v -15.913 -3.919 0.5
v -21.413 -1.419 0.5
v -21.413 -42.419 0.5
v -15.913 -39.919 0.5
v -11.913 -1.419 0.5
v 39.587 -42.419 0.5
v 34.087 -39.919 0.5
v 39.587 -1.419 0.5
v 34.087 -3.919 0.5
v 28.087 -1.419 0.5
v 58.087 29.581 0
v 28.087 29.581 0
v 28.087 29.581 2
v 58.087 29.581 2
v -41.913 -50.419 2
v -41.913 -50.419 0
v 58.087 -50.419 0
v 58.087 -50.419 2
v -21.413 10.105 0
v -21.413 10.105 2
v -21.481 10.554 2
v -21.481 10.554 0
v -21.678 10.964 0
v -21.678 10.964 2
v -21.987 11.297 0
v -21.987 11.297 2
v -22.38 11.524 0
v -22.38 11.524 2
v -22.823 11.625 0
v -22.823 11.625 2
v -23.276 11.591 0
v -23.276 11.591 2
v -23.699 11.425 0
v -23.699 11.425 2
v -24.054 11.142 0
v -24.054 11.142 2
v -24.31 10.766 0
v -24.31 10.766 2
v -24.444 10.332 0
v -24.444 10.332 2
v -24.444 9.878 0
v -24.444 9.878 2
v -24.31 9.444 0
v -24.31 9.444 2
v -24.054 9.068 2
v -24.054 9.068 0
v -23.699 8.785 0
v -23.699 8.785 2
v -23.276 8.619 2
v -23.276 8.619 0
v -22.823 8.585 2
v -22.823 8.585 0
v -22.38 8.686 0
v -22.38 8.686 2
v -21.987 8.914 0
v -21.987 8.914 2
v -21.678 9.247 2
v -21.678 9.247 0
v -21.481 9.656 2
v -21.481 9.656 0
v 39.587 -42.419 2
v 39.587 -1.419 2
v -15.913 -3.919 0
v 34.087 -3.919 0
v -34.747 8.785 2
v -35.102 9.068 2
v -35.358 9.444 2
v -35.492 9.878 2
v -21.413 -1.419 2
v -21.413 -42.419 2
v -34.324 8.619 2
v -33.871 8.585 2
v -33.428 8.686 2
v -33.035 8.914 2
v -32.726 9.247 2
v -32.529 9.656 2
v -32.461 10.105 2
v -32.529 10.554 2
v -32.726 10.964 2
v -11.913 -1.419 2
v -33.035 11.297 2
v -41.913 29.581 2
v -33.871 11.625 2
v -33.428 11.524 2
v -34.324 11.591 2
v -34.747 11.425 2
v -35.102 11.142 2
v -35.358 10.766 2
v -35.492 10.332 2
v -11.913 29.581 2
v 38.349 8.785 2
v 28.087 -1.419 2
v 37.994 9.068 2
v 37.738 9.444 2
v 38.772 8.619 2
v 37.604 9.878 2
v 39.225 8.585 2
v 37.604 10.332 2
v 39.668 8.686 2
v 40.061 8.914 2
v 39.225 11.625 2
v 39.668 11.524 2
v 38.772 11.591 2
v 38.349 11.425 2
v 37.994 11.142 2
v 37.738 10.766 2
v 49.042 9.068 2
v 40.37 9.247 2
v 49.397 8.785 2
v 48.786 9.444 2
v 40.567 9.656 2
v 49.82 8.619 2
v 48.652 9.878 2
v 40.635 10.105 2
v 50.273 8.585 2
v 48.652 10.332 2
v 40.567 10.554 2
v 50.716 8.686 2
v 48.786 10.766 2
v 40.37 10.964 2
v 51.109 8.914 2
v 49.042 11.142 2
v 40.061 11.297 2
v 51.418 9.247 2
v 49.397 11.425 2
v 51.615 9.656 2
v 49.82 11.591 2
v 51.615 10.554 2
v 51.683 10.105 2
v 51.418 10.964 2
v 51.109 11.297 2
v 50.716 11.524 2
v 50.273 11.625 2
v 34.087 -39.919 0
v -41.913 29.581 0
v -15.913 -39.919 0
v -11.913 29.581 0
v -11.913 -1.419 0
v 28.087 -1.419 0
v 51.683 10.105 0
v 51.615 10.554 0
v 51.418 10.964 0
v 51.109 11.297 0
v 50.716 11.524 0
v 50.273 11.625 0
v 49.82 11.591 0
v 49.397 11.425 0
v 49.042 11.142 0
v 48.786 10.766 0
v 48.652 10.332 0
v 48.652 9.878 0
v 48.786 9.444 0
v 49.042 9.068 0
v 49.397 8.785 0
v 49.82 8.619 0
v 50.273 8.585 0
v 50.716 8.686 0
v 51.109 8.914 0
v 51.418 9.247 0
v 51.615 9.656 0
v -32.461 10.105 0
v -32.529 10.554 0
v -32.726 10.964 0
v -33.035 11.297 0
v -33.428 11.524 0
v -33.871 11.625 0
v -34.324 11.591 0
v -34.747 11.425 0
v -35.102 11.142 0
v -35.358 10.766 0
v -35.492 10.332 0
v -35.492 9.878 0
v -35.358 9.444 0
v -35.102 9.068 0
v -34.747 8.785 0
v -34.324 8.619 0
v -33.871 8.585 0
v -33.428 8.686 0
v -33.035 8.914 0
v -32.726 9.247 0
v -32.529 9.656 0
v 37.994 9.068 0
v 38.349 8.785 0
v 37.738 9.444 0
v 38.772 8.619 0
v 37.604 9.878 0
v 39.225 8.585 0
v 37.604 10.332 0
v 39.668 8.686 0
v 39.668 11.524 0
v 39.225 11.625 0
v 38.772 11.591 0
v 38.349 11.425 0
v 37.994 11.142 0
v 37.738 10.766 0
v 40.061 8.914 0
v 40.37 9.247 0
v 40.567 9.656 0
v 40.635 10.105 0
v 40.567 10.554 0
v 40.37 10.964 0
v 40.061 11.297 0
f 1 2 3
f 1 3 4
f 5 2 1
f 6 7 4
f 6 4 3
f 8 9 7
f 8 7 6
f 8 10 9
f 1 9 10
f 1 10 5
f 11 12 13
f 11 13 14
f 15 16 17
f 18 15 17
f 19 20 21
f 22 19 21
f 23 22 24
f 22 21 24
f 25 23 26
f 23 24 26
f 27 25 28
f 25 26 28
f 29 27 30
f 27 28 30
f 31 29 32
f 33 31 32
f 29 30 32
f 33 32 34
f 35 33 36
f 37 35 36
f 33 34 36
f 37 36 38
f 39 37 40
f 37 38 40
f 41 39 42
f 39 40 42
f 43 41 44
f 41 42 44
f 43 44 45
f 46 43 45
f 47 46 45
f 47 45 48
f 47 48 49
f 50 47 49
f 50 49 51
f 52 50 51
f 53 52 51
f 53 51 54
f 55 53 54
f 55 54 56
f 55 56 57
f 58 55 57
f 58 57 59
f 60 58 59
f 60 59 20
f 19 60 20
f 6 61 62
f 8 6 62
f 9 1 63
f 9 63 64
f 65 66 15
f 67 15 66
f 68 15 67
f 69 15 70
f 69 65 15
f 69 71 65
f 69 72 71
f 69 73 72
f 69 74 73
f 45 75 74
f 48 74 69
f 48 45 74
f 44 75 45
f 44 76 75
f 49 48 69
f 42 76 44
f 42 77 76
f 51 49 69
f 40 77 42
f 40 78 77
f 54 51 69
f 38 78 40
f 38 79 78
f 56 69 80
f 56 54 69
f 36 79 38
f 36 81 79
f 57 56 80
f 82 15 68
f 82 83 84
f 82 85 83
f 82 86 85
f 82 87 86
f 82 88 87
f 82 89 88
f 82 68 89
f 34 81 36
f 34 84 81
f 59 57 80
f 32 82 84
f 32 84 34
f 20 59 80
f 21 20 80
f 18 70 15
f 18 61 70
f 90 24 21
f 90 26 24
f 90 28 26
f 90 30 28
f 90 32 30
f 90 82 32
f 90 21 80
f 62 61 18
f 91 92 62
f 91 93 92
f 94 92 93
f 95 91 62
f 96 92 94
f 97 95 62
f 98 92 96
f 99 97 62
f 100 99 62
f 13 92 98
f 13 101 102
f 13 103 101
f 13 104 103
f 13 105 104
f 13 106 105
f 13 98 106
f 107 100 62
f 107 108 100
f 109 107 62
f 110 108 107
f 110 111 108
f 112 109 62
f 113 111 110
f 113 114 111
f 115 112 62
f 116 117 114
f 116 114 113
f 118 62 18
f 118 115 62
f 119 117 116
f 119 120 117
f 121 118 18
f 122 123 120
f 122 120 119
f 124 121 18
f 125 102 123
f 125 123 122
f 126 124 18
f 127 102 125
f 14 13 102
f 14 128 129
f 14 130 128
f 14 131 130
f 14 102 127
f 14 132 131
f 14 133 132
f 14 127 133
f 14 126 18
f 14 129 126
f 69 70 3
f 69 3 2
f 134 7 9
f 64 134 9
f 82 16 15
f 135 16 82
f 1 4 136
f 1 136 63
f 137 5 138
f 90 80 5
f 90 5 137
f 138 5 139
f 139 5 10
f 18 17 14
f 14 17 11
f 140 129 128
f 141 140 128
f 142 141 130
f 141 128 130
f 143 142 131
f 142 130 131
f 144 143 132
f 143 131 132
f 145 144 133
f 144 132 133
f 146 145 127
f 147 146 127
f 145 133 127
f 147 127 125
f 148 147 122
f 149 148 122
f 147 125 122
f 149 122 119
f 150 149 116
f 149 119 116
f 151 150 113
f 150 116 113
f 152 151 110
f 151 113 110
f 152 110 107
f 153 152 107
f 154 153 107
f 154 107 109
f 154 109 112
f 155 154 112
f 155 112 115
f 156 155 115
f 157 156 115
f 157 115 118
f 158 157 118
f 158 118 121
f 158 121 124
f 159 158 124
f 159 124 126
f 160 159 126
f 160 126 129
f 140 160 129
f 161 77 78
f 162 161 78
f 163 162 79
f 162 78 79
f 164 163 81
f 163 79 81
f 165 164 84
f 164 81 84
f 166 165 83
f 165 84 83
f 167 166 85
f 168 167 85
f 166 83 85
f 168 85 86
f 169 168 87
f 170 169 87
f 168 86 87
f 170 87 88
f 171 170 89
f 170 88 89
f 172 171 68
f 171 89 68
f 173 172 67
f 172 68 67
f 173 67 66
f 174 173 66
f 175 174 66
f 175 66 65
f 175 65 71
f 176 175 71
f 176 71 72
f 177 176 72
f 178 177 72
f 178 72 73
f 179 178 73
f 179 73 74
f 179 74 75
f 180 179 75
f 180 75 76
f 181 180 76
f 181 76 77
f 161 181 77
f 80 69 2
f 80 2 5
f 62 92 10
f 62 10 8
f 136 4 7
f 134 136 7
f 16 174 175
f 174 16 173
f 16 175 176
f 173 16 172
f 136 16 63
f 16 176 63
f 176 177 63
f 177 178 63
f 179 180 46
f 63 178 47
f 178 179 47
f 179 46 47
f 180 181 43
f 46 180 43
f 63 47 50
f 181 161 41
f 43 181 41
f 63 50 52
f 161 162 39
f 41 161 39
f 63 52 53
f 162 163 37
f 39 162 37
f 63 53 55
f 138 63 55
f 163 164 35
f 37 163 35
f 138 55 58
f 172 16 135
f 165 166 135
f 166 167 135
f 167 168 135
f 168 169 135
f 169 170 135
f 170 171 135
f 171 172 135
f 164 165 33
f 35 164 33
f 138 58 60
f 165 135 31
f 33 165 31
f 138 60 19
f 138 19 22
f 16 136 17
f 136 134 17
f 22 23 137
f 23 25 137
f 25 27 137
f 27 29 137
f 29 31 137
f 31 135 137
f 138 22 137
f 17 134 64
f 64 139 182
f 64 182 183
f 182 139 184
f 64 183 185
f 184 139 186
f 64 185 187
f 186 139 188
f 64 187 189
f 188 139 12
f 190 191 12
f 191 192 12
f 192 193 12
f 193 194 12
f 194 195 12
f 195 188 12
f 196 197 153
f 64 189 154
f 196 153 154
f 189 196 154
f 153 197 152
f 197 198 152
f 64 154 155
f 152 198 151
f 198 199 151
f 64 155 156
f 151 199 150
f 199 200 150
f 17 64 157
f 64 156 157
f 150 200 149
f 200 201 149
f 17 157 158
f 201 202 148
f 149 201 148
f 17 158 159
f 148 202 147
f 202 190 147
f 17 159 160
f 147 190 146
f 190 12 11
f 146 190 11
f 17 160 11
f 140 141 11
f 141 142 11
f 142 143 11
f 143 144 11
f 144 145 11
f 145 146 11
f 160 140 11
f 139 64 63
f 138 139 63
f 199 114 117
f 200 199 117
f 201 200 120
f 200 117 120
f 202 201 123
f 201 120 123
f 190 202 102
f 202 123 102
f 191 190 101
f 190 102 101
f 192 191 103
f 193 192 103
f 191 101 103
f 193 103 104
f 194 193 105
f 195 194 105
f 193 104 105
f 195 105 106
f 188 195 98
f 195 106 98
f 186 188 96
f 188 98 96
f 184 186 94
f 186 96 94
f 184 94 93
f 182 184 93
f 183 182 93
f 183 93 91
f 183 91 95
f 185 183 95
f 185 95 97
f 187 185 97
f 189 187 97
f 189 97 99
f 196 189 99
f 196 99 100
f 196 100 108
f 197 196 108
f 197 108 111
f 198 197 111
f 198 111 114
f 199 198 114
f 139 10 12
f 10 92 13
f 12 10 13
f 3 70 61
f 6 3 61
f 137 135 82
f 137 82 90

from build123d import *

# Parameters (mm, degrees)
F0_W     = 100
F0_H     = 80
F1_DEPTH = 2
F2_W     = 40
F2_H     = 31
F3_DEPTH = 2.001
F4_W     = 61
F4_H     = 41
F5_DEPTH = 1.5
F6_R     = 1.524
F6_R_2   = 1.524001
F7_DEPTH = 2.001
F8_W     = 50
F8_H     = 36
F9_DEPTH = 0.501


with BuildPart() as f1:
    # F0 (on Top) → F1 (new body)
    with BuildSketch(Plane.XY):
        with Locations((8.086769, -10.418962)):
            Rectangle(F0_W, F0_H)
    extrude(amount=F1_DEPTH)

    # F2 (on face) → F3 (cut, through all)
    with BuildSketch(Plane.XY.offset(2)):
        with Locations((8.086769, 14.081038)):
            Rectangle(F2_W, F2_H)
    extrude(amount=-F3_DEPTH, mode=Mode.SUBTRACT)

    # F4 (on face) → F5 (cut)
    with BuildSketch(Plane.XY.offset(2)):
        with Locations((9.086769, -21.918962)):
            Rectangle(F4_W, F4_H)
    extrude(amount=-F5_DEPTH, mode=Mode.SUBTRACT)

    # F6 (on face) → F7 (cut, through all)
    with BuildSketch(Plane.XY.offset(2)):
        with Locations((-33.985233, 10.10504)):
            Circle(F6_R)
        with Locations((-22.937232, 10.105039)):
            Circle(F6_R_2)
        with Locations((50.158769, 10.105038)):
            Circle(F6_R)
        with Locations((39.110769, 10.105038)):
            Circle(F6_R)
    extrude(amount=-F7_DEPTH, mode=Mode.SUBTRACT)

    # F8 (on face) → F9 (cut, through all)
    with BuildSketch(Plane.XY.offset(0.5)):
        with Locations((9.086769, -21.918962)):
            Rectangle(F8_W, F8_H)
    extrude(amount=-F9_DEPTH, mode=Mode.SUBTRACT)


solid = f1.part
